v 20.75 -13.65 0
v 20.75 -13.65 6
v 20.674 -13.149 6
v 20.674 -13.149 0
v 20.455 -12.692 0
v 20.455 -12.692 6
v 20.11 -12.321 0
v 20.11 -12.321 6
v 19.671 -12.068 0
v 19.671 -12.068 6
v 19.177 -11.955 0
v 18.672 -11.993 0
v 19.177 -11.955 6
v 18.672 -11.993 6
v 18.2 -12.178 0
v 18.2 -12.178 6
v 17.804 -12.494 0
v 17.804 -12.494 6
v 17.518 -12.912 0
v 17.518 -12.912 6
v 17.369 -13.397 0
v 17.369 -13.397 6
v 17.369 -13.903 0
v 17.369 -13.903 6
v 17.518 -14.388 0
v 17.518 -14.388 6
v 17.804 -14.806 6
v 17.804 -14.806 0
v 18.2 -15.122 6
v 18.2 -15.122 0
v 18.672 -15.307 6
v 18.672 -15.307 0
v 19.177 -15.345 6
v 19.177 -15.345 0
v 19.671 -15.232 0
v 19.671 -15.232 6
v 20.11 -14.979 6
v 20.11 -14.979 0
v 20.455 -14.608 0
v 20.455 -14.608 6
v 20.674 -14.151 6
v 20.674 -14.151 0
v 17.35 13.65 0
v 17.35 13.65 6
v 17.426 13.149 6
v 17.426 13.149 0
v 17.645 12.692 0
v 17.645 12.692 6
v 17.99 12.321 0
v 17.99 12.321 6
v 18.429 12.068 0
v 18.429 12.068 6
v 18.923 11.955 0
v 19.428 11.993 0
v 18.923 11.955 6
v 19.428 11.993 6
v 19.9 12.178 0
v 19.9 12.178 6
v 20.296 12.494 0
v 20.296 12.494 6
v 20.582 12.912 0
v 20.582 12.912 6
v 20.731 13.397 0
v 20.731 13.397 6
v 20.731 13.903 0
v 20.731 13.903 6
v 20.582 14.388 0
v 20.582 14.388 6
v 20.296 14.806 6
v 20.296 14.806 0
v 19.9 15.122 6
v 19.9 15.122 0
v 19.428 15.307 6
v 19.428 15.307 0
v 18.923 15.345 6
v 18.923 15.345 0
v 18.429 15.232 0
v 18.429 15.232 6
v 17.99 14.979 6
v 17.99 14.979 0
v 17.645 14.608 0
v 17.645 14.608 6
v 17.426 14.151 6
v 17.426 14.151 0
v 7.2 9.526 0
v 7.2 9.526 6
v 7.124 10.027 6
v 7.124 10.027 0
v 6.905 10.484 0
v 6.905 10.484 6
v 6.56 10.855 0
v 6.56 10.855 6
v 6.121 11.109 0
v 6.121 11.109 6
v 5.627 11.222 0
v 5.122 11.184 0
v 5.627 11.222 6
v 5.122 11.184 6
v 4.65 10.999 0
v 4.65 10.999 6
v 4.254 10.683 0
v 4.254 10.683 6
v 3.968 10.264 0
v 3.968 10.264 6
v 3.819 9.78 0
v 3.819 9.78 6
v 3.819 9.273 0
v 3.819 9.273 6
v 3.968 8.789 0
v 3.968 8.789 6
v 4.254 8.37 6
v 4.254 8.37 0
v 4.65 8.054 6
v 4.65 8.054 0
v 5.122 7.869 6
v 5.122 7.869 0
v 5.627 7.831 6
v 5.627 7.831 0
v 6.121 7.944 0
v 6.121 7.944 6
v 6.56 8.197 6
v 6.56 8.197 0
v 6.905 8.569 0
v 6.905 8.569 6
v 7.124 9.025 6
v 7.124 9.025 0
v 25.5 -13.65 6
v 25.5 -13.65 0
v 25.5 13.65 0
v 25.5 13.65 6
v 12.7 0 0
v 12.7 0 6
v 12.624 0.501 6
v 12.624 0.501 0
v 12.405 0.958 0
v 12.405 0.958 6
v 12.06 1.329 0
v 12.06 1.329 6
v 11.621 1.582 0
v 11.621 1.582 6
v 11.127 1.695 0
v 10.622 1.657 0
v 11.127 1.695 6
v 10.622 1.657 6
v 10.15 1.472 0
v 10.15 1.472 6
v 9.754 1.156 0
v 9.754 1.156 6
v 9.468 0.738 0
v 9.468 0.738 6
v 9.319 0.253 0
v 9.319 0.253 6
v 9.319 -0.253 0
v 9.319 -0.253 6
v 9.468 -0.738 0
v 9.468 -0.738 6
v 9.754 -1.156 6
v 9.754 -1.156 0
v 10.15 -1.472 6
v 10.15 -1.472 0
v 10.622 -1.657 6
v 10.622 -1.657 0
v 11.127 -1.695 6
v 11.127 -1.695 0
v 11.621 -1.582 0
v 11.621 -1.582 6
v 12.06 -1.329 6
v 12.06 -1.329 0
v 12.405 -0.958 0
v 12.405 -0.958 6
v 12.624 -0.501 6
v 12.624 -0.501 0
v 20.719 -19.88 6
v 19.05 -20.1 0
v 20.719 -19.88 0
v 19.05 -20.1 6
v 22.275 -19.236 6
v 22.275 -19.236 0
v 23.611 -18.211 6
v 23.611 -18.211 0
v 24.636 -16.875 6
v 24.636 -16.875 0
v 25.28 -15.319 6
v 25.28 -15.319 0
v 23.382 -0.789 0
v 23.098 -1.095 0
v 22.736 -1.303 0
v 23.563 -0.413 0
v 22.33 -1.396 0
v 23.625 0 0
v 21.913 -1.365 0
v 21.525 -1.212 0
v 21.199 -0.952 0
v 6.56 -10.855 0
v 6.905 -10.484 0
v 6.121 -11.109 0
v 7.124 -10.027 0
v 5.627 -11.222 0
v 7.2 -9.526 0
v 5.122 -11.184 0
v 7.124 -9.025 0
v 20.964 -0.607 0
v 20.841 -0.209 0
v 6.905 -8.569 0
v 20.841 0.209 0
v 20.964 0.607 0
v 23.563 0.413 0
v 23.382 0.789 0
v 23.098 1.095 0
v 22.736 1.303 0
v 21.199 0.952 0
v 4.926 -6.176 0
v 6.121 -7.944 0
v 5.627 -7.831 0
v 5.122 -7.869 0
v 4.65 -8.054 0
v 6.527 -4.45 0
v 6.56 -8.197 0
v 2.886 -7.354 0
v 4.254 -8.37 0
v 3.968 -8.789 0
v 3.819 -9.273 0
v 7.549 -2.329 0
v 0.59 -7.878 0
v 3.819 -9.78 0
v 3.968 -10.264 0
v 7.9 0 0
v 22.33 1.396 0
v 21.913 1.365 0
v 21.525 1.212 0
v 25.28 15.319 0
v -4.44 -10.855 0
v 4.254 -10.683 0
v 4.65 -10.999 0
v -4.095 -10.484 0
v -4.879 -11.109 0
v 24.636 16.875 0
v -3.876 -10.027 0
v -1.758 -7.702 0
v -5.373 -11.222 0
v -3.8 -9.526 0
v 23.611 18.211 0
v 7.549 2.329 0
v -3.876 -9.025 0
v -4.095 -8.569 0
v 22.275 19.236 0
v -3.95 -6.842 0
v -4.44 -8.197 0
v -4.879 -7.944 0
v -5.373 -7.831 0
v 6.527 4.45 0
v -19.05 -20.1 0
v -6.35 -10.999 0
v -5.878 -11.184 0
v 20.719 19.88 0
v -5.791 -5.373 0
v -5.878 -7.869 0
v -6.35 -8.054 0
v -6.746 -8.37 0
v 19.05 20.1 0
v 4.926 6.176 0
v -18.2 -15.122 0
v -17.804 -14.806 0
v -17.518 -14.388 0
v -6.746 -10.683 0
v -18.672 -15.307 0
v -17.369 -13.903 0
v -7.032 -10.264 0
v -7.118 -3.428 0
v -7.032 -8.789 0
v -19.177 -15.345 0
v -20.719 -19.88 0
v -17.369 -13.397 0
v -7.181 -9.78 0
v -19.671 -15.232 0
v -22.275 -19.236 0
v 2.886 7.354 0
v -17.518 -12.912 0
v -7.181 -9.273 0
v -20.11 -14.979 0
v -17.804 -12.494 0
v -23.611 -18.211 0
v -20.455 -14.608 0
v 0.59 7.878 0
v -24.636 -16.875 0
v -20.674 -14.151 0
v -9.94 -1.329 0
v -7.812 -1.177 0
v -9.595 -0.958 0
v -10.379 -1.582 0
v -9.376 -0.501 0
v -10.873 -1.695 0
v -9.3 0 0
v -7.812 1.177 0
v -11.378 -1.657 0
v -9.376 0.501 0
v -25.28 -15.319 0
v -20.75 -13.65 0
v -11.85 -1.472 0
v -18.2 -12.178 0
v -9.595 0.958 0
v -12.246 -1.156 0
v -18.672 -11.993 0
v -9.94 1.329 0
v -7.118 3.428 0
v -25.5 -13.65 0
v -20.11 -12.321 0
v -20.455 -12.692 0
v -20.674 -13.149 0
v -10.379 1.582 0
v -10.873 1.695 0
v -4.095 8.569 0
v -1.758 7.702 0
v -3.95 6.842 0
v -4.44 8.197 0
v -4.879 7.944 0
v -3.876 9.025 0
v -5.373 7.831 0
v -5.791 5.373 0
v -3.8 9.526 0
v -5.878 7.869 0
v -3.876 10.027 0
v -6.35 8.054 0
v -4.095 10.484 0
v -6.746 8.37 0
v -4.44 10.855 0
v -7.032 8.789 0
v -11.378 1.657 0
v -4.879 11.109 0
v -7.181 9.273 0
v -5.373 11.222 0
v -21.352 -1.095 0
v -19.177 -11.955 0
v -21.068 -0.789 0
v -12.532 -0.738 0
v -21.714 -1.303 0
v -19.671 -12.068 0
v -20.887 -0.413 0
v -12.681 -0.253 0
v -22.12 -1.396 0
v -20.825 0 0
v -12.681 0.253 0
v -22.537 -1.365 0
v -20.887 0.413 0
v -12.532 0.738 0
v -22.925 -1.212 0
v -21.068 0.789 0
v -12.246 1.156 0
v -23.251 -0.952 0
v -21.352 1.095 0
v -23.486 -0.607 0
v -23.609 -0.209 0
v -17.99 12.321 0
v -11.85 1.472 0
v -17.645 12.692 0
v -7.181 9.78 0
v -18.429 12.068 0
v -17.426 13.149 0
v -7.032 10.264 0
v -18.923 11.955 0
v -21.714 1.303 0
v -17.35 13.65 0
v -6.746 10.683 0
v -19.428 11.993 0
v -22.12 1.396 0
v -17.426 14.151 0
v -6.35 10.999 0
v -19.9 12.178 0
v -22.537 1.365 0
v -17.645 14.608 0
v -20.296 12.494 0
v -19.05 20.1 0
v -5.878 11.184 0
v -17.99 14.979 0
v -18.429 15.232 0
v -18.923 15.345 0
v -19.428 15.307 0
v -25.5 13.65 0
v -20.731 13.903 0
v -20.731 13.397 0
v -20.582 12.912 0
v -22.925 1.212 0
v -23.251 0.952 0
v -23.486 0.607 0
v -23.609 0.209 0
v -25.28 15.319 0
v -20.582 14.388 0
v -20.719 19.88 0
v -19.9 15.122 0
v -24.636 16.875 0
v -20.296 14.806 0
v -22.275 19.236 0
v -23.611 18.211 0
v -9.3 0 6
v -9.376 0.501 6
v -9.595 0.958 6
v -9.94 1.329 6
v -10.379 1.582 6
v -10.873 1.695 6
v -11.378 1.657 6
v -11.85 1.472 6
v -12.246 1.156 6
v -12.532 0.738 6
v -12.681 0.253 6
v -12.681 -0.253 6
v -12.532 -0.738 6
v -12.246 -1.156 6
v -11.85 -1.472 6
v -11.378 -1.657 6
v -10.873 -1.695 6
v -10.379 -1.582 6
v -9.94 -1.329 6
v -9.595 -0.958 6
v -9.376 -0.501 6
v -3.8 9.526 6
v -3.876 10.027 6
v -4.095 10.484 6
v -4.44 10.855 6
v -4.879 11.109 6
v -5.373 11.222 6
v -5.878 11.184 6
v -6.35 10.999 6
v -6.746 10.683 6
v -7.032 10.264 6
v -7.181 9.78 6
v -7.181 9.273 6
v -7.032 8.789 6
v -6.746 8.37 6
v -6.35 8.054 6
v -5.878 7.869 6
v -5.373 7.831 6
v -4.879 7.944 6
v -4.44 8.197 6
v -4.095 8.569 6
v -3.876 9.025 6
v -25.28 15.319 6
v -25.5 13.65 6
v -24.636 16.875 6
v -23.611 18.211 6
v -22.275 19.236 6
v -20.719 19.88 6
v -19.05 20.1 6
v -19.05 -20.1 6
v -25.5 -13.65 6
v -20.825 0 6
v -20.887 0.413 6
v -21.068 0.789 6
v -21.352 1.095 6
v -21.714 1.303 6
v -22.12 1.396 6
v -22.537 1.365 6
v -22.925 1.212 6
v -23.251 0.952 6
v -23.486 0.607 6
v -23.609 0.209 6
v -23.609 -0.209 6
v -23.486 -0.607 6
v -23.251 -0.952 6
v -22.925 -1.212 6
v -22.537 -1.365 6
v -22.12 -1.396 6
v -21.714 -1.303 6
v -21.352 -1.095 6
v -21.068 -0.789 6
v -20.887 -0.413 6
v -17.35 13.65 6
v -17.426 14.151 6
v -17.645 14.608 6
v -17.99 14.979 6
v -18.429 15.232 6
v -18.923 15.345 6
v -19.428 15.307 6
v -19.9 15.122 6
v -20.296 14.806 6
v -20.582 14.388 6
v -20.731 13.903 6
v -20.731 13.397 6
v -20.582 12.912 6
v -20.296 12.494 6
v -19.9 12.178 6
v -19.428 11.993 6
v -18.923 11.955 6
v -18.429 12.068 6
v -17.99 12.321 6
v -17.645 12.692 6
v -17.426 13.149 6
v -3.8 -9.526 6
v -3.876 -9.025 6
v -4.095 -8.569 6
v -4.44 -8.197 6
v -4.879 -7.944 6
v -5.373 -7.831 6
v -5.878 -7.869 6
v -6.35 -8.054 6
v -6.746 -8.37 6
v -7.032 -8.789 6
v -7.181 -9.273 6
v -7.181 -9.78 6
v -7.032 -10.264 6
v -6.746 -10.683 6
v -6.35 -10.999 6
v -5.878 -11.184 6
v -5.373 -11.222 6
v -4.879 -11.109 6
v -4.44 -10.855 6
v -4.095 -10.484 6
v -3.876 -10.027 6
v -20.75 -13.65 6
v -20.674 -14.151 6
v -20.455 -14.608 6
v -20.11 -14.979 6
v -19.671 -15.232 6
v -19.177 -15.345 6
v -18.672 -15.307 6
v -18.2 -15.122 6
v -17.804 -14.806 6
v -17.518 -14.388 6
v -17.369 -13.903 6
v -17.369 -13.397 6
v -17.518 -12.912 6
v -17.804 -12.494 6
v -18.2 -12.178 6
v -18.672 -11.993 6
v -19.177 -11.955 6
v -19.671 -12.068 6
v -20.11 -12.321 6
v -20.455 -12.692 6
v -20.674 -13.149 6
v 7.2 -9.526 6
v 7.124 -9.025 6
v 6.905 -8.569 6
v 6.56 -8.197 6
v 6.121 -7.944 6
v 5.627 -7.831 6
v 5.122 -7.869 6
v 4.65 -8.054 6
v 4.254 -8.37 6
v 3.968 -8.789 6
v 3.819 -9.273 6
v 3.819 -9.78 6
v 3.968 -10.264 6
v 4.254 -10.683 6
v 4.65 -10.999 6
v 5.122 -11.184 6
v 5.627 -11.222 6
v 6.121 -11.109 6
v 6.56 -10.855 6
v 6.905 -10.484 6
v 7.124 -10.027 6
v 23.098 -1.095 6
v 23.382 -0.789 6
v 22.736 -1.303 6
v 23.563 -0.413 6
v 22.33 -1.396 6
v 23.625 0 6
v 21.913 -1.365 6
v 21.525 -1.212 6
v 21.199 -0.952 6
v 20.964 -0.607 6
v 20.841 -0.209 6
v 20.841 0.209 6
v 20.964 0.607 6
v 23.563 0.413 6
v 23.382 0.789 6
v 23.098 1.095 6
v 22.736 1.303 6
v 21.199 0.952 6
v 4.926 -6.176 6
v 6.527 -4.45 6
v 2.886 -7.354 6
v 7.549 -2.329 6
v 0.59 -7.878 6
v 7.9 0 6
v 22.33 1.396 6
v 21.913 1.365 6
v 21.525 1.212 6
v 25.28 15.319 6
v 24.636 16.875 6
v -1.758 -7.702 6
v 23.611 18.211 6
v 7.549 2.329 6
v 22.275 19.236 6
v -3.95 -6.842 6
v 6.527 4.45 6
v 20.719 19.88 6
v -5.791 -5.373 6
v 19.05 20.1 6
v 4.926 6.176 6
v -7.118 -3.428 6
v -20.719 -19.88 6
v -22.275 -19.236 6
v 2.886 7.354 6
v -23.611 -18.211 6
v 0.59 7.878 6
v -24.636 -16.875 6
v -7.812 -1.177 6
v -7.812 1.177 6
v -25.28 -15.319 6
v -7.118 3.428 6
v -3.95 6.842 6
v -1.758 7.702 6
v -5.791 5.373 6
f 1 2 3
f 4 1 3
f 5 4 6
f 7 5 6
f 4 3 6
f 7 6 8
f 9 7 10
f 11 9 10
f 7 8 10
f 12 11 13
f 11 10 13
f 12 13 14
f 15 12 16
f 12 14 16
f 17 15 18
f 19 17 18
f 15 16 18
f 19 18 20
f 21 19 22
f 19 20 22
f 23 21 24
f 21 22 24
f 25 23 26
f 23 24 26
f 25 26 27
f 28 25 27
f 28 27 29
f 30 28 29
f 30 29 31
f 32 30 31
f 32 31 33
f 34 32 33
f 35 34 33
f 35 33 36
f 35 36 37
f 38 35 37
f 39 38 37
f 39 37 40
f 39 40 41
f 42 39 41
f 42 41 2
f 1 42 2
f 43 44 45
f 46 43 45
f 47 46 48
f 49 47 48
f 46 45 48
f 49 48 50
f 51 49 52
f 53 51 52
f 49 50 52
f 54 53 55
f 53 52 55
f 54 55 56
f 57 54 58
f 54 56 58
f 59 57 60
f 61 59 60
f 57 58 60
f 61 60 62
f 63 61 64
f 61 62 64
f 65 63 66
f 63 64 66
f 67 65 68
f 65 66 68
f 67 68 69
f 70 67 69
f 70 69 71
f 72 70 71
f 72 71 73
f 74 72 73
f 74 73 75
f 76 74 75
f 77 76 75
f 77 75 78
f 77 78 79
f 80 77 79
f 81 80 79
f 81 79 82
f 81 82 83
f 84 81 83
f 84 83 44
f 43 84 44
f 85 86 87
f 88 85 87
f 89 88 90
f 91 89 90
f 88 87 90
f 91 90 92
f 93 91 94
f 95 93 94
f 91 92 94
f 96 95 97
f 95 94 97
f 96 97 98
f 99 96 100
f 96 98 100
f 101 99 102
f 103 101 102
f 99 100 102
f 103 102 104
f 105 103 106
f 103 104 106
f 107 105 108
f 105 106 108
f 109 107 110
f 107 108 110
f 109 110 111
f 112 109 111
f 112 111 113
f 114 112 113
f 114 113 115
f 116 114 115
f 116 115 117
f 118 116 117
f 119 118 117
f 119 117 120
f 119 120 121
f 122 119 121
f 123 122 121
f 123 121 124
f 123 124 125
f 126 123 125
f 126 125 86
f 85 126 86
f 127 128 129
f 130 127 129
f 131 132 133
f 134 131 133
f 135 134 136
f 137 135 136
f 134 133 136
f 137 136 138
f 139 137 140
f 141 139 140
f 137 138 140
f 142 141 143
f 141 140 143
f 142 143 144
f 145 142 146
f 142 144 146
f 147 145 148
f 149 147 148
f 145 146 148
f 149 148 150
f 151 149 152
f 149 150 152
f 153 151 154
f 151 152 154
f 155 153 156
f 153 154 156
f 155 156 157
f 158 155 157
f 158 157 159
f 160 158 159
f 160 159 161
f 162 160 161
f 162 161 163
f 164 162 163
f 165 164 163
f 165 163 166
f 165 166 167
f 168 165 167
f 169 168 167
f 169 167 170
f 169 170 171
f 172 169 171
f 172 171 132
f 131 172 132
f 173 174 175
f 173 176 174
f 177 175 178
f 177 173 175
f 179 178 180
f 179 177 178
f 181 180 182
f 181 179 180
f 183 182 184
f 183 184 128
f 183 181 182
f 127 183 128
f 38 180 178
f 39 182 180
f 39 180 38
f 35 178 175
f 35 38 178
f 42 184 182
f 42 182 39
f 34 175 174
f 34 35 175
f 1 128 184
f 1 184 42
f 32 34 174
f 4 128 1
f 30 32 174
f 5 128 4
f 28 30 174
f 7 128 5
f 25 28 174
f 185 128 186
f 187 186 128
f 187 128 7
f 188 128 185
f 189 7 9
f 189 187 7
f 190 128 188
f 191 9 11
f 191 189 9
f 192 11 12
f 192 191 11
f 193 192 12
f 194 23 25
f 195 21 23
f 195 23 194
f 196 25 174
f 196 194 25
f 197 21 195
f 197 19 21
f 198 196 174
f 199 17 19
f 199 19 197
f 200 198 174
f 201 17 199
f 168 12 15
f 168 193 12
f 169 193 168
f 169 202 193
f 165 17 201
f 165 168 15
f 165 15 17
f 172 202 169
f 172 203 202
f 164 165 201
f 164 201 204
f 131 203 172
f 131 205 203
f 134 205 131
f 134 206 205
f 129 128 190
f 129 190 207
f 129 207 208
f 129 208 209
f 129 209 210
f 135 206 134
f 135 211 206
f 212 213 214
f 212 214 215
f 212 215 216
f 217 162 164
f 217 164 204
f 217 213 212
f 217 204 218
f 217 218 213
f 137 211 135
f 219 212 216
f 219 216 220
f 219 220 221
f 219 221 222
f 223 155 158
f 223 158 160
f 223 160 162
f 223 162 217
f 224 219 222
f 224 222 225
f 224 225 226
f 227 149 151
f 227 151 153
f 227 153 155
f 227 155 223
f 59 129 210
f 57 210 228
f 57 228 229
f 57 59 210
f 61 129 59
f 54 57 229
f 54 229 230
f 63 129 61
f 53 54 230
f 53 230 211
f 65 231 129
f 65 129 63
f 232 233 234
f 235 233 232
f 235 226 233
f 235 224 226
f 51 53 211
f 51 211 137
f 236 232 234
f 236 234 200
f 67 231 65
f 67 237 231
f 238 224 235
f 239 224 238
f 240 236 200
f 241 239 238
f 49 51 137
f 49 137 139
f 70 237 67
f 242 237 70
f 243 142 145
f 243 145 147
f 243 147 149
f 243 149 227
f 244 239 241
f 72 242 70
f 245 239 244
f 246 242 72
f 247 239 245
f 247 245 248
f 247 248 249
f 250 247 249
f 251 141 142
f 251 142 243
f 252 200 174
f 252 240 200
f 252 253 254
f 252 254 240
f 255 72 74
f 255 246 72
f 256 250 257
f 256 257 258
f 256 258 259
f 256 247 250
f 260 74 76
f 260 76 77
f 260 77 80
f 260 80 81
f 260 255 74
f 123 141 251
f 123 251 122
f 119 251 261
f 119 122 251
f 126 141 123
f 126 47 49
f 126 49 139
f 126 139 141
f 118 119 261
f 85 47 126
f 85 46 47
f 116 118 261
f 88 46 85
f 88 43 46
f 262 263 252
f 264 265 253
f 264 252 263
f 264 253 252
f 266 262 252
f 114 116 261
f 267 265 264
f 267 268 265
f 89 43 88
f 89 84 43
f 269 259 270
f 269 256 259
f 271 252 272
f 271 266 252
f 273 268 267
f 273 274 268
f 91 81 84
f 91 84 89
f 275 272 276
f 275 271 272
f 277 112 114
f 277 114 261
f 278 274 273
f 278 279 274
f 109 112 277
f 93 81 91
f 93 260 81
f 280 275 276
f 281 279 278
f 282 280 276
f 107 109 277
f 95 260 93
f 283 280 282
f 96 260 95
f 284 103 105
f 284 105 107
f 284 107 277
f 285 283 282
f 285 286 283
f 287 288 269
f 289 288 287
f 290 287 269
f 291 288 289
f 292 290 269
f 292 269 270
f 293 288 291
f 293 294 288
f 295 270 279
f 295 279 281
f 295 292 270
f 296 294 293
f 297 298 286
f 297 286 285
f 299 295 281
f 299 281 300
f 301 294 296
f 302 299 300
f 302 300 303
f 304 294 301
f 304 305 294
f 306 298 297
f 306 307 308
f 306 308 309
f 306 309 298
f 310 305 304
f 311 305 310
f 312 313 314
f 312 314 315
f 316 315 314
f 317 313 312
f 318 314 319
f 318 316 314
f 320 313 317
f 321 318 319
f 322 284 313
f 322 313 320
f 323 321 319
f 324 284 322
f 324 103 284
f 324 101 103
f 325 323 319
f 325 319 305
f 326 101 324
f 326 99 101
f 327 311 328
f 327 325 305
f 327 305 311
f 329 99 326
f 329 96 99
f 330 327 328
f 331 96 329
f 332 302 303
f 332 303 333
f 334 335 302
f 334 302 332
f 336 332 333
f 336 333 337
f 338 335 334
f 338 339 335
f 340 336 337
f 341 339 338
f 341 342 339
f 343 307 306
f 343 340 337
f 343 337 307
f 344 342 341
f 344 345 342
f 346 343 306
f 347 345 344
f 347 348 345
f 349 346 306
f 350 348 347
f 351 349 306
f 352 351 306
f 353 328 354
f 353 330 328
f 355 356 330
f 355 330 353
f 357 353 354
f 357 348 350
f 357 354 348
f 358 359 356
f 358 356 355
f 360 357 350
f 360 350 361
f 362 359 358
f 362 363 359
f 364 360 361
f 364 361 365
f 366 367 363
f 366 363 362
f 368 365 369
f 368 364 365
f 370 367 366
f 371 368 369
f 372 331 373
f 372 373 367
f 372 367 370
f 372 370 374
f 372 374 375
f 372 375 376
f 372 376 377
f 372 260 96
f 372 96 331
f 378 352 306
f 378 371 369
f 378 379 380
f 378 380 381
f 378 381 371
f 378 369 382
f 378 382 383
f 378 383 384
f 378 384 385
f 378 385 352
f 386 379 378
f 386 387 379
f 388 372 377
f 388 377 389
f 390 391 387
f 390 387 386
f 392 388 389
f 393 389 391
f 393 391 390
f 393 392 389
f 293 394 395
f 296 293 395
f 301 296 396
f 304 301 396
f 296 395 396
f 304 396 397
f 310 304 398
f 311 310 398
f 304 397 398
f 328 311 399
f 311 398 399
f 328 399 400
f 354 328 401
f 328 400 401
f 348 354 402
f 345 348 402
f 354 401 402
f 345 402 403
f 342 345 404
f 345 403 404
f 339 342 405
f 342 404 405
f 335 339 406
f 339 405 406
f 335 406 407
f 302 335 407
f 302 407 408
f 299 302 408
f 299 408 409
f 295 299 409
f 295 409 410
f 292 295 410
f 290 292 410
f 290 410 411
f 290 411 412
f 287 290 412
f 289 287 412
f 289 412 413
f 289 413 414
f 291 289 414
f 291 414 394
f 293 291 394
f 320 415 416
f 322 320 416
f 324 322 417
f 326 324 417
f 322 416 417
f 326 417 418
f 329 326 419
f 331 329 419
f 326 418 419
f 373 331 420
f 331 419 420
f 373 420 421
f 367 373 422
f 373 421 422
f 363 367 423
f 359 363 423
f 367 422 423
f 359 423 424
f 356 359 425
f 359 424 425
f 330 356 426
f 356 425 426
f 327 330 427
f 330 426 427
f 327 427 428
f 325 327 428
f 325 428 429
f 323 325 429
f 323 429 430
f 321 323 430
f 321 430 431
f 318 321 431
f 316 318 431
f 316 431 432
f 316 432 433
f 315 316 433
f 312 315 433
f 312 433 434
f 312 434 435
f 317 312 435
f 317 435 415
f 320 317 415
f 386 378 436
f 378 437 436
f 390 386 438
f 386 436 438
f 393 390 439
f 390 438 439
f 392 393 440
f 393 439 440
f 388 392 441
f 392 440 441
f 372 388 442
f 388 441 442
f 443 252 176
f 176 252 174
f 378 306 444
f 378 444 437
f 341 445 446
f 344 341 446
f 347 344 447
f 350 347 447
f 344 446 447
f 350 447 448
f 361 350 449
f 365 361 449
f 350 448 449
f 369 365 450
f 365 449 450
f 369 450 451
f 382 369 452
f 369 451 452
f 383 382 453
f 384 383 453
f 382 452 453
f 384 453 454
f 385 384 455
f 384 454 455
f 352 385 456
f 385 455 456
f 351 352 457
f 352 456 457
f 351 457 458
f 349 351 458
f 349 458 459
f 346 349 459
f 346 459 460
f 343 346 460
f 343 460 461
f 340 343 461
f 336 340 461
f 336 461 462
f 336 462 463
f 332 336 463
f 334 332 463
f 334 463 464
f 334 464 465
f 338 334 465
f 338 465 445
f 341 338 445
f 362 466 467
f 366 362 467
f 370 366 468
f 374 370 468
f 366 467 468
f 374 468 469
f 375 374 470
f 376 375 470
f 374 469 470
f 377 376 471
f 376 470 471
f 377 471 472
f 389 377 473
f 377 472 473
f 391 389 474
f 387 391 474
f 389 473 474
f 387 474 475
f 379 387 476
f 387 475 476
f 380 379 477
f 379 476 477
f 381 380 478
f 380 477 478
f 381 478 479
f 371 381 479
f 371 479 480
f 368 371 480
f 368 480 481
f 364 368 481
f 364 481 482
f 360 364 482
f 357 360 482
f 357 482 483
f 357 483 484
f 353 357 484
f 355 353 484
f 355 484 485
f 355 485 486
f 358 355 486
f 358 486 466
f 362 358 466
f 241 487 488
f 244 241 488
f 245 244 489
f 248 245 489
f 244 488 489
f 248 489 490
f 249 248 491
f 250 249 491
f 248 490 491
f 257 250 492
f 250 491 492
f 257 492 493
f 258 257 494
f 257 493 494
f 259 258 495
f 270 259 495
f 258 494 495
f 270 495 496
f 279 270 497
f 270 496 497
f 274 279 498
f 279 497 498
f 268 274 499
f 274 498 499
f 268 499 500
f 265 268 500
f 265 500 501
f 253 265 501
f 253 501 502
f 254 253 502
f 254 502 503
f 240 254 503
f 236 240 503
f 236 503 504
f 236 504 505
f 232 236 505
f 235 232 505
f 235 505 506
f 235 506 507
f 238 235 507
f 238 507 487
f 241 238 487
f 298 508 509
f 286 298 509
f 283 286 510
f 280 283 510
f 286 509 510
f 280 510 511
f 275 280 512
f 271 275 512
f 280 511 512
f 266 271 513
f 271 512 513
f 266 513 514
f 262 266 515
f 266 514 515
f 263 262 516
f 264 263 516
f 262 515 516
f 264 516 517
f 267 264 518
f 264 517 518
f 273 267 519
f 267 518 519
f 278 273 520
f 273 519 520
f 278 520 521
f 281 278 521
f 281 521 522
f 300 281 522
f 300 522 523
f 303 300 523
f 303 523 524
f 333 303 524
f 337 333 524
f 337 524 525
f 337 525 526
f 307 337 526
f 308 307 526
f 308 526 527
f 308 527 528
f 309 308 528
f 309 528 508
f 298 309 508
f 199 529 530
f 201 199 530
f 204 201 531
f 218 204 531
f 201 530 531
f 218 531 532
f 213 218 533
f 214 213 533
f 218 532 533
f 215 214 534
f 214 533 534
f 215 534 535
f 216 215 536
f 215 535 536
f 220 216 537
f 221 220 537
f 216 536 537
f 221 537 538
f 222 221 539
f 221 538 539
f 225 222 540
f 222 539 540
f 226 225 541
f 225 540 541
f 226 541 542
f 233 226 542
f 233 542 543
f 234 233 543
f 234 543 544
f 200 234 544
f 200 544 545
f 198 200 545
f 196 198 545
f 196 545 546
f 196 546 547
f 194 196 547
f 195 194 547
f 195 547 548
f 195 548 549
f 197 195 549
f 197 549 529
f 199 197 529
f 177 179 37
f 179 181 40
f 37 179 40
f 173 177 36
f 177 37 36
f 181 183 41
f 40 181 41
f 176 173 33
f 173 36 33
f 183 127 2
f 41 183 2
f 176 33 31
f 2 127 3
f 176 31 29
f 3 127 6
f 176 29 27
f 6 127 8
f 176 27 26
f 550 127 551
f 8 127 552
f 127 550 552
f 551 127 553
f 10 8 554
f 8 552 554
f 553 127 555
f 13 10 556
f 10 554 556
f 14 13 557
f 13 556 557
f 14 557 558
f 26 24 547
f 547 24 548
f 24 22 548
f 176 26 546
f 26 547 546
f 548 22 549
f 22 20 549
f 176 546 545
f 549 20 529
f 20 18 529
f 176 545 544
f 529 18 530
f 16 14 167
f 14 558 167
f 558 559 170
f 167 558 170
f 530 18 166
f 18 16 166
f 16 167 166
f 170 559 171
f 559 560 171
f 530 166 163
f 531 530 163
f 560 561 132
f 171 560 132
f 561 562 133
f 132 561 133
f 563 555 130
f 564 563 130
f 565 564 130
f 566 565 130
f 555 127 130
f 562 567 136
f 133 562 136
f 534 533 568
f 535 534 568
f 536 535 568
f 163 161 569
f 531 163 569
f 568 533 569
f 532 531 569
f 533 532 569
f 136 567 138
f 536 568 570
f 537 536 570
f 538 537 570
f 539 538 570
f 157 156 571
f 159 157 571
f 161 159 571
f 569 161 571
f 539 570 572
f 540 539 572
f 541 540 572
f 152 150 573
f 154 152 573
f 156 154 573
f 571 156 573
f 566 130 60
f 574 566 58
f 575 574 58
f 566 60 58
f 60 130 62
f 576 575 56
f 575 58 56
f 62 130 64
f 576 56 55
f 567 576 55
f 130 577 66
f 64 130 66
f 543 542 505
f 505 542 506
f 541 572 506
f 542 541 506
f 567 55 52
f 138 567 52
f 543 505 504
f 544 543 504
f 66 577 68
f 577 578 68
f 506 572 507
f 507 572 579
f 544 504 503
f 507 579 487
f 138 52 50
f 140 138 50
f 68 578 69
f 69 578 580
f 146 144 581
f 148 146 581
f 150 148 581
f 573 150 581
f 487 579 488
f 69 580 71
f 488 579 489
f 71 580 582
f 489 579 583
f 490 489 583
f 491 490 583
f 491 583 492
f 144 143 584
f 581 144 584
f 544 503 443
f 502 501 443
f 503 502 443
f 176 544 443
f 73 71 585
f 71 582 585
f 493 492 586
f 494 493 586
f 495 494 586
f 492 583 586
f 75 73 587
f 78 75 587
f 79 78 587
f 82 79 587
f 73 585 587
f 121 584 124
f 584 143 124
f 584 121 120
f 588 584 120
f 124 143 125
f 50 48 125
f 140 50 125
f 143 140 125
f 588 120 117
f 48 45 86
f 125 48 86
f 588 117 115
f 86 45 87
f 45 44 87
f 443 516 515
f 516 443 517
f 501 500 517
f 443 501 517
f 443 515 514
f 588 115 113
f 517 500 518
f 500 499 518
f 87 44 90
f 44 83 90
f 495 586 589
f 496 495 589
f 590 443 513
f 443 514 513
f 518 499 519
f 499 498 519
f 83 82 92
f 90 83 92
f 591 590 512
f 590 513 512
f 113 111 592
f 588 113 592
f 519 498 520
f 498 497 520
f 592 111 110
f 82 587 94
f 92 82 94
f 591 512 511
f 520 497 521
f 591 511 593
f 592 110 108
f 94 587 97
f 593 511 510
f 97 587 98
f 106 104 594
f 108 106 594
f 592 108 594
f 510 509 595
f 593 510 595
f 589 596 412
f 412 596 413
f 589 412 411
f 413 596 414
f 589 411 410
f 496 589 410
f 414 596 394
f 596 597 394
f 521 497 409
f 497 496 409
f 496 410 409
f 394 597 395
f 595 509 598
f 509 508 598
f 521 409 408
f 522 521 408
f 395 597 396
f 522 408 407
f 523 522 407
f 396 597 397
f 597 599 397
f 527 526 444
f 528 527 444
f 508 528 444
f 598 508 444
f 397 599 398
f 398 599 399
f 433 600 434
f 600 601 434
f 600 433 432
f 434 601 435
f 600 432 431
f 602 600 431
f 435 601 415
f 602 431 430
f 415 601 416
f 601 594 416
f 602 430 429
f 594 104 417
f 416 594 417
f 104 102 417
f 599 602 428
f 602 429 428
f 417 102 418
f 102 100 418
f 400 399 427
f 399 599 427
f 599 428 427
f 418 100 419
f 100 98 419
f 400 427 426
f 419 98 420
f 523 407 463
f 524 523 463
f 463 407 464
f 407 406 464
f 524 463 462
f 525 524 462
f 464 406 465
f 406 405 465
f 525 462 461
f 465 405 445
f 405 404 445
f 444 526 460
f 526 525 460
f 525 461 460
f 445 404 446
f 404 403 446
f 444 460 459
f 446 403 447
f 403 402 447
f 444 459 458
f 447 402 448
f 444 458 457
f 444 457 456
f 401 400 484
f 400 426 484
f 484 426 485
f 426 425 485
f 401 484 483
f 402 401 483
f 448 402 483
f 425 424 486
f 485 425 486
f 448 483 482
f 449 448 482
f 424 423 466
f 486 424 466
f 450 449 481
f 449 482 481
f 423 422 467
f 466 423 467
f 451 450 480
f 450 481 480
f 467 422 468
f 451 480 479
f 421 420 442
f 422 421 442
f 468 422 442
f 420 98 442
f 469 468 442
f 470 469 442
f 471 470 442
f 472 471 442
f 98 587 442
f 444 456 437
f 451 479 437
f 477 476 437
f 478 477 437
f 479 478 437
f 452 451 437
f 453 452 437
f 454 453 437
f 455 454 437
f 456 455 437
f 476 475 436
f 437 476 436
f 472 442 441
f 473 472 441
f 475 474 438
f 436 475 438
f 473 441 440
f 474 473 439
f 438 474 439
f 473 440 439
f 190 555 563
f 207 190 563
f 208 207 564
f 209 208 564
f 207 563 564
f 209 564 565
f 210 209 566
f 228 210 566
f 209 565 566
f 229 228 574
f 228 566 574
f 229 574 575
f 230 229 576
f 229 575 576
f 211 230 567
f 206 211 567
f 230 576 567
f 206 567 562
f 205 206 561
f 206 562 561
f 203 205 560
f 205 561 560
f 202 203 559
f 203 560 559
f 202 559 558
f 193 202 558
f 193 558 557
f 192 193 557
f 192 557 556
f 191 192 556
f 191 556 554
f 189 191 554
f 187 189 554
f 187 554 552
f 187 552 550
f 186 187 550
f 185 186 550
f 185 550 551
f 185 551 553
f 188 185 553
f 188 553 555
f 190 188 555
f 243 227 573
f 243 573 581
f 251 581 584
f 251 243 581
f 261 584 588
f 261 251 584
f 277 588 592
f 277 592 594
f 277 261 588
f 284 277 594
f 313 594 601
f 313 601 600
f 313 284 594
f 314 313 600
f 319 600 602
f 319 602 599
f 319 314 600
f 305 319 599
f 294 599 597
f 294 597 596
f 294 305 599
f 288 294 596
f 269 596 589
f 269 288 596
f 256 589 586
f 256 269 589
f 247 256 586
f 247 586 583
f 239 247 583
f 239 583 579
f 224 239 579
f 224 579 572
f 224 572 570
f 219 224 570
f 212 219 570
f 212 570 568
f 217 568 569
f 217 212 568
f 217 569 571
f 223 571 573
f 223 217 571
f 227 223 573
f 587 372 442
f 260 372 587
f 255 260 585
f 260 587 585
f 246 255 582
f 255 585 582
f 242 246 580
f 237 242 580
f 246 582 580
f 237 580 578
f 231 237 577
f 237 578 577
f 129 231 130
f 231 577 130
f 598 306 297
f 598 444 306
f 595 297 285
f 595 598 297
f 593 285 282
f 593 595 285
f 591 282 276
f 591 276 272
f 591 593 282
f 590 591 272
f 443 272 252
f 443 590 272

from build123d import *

# Parameters (mm, degrees)
SKETCH1_W           = 50.8
SKETCH1_H           = 40
SKETCH1_R           = 8
BOSS_EXTRUDE1_DEPTH = 6
FILLET1_R           = 6.35
SKETCH8_R           = 1.5
CUT_EXTRUDE1_DEPTH  = 33.880997552
SKETCH9_R           = 1.8
M3_THROUGH_DEPTH    = 33.880997552
MOVE_FACE2_BY       = 0.1
MOVE_FACE2_2_BY     = 0.1
MOVE_FACE2_3_BY     = 0.1
MOVE_FACE2_4_BY     = 0.1
MOVE_FACE2_5_BY     = 0.1
MOVE_FACE2_6_BY     = 0.1
MOVE_FACE2_7_BY     = 0.1
MOVE_FACE2_8_BY     = 0.1
MOVE_FACE2_9_BY     = 0.1
MOVE_FACE2_10_BY    = 0.1
MOVE_FACE2_11_BY    = 0.1
MOVE_FACE2_12_BY    = 0.1
MOVE_FACE2_13_BY    = 0.1
MOVE_FACE2_14_BY    = 0.1
MOVE_FACE2_15_BY    = 0.1
MOVE_FACE2_16_BY    = 0.1
MOVE_FACE2_17_BY    = 0.1
MOVE_FACE2_18_BY    = 0.1
MOVE_FACE2_19_BY    = 0.1
MOVE_FACE2_20_BY    = 0.1
MOVE_FACE2_21_BY    = 0.1


with BuildPart() as part:
    # Sketch1 → Boss-Extrude1 (new body)
    with BuildSketch(Plane.XY):
        Rectangle(SKETCH1_W, SKETCH1_H)
        Circle(SKETCH1_R, mode=Mode.SUBTRACT)
    extrude(amount=BOSS_EXTRUDE1_DEPTH)

    # Fillet1
    fillet1_edges = [part.edges().sort_by_distance(p)[0] for p in [
        (-25.4, 20, 3),
        (25.4, 20, 3),
        (25.4, -20, 3),
        (-25.4, -20, 3),
    ]]
    fillet(fillet1_edges, radius=FILLET1_R)

    # Sketch8 → Cut-Extrude1 (cut, through all)
    with BuildSketch(Plane.XY.offset(6)):
        with Locations((22.225, 0)):
            Circle(SKETCH8_R)
        with Locations((-22.225, 0)):
            Circle(SKETCH8_R)
    extrude(amount=-CUT_EXTRUDE1_DEPTH, mode=Mode.SUBTRACT)

    # Sketch9 → M3-through (cut, through all)
    with BuildSketch(Plane.XY.offset(6)):
        with Locations((-19.05, 13.65)):
            Circle(SKETCH9_R)
        with Locations(Location((-19.05, -13.65, 0), (0, 0, 180))):
            Circle(SKETCH9_R)
        with Locations((19.05, -13.65)):
            Circle(SKETCH9_R)
        with Locations(Location((19.05, 13.65, 0), (0, 0, 180))):
            Circle(SKETCH9_R)
        with Locations((11, 0)):
            Circle(SKETCH9_R)
        with Locations((5.5, -9.526279442)):
            Circle(SKETCH9_R)
        with Locations((-5.5, -9.526279442)):
            Circle(SKETCH9_R)
        with Locations((-11, 0)):
            Circle(SKETCH9_R)
        with Locations((-5.5, 9.526279442)):
            Circle(SKETCH9_R)
        with Locations((5.5, 9.526279442)):
            Circle(SKETCH9_R)
    extrude(amount=-M3_THROUGH_DEPTH, mode=Mode.SUBTRACT)

    # Move Face2: a face moved outward by 0.1
    extrude(part.faces().sort_by_distance((-25.4, 0, 3))[0], amount=MOVE_FACE2_BY, dir=(-1, 0, 0))

    # Move Face2 2: a curved face moved outward by 0.1
    add(Solid.thicken(part.faces().sort_by_distance((-23.540128061, 18.140128061, 3))[0], MOVE_FACE2_2_BY))

    # Move Face2 3: a face moved outward by 0.1
    extrude(part.faces().sort_by_distance((0, 20, 3))[0], amount=MOVE_FACE2_3_BY, dir=(0, 1, 0))

    # Move Face2 4: a curved face moved outward by 0.1
    add(Solid.thicken(part.faces().sort_by_distance((23.540128061, 18.140128061, 3))[0], MOVE_FACE2_4_BY))

    # Move Face2 5: a face moved outward by 0.1
    extrude(part.faces().sort_by_distance((25.4, 0, 3))[0], amount=MOVE_FACE2_5_BY, dir=(1, 0, 0))

    # Move Face2 6: a face moved outward by 0.1
    extrude(part.faces().sort_by_distance((0, -20, 3))[0], amount=MOVE_FACE2_6_BY, dir=(0, -1, 0))

    # Move Face2 7: a curved face moved outward by 0.1
    add(Solid.thicken(part.faces().sort_by_distance((-17.25, -13.65, 3))[0], MOVE_FACE2_7_BY))

    # Move Face2 8: a curved face moved outward by 0.1
    add(Solid.thicken(part.faces().sort_by_distance((-8, 0, 3))[0], MOVE_FACE2_8_BY))

    # Move Face2 9: a curved face moved outward by 0.1
    add(Solid.thicken(part.faces().sort_by_distance((20.725, 0, 3))[0], MOVE_FACE2_9_BY))

    # Move Face2 10: a curved face moved outward by 0.1
    add(Solid.thicken(part.faces().sort_by_distance((-23.725, 0, 3))[0], MOVE_FACE2_10_BY))

    # Move Face2 11: a curved face moved outward by 0.1
    add(Solid.thicken(part.faces().sort_by_distance((-20.85, 13.65, 3))[0], MOVE_FACE2_11_BY))

    # Move Face2 12: a curved face moved outward by 0.1
    add(Solid.thicken(part.faces().sort_by_distance((17.25, -13.65, 3))[0], MOVE_FACE2_12_BY))

    # Move Face2 13: a curved face moved outward by 0.1
    add(Solid.thicken(part.faces().sort_by_distance((20.85, 13.65, 3))[0], MOVE_FACE2_13_BY))

    # Move Face2 14: a curved face moved outward by 0.1
    add(Solid.thicken(part.faces().sort_by_distance((9.2, 0, 3))[0], MOVE_FACE2_14_BY))

    # Move Face2 15: a curved face moved outward by 0.1
    add(Solid.thicken(part.faces().sort_by_distance((3.7, -9.526279442, 3))[0], MOVE_FACE2_15_BY))

    # Move Face2 16: a curved face moved outward by 0.1
    add(Solid.thicken(part.faces().sort_by_distance((-7.3, -9.526279442, 3))[0], MOVE_FACE2_16_BY))

    # Move Face2 17: a curved face moved outward by 0.1
    add(Solid.thicken(part.faces().sort_by_distance((-12.8, 0, 3))[0], MOVE_FACE2_17_BY))

    # Move Face2 18: a curved face moved outward by 0.1
    add(Solid.thicken(part.faces().sort_by_distance((-7.3, 9.526279442, 3))[0], MOVE_FACE2_18_BY))

    # Move Face2 19: a curved face moved outward by 0.1
    add(Solid.thicken(part.faces().sort_by_distance((3.7, 9.526279442, 3))[0], MOVE_FACE2_19_BY))

    # Move Face2 20: a curved face moved outward by 0.1
    add(Solid.thicken(part.faces().sort_by_distance((-23.540128061, -18.140128061, 3))[0], MOVE_FACE2_20_BY))

    # Move Face2 21: a curved face moved outward by 0.1
    add(Solid.thicken(part.faces().sort_by_distance((23.540128061, -18.140128061, 3))[0], MOVE_FACE2_21_BY))


solid = part.part
